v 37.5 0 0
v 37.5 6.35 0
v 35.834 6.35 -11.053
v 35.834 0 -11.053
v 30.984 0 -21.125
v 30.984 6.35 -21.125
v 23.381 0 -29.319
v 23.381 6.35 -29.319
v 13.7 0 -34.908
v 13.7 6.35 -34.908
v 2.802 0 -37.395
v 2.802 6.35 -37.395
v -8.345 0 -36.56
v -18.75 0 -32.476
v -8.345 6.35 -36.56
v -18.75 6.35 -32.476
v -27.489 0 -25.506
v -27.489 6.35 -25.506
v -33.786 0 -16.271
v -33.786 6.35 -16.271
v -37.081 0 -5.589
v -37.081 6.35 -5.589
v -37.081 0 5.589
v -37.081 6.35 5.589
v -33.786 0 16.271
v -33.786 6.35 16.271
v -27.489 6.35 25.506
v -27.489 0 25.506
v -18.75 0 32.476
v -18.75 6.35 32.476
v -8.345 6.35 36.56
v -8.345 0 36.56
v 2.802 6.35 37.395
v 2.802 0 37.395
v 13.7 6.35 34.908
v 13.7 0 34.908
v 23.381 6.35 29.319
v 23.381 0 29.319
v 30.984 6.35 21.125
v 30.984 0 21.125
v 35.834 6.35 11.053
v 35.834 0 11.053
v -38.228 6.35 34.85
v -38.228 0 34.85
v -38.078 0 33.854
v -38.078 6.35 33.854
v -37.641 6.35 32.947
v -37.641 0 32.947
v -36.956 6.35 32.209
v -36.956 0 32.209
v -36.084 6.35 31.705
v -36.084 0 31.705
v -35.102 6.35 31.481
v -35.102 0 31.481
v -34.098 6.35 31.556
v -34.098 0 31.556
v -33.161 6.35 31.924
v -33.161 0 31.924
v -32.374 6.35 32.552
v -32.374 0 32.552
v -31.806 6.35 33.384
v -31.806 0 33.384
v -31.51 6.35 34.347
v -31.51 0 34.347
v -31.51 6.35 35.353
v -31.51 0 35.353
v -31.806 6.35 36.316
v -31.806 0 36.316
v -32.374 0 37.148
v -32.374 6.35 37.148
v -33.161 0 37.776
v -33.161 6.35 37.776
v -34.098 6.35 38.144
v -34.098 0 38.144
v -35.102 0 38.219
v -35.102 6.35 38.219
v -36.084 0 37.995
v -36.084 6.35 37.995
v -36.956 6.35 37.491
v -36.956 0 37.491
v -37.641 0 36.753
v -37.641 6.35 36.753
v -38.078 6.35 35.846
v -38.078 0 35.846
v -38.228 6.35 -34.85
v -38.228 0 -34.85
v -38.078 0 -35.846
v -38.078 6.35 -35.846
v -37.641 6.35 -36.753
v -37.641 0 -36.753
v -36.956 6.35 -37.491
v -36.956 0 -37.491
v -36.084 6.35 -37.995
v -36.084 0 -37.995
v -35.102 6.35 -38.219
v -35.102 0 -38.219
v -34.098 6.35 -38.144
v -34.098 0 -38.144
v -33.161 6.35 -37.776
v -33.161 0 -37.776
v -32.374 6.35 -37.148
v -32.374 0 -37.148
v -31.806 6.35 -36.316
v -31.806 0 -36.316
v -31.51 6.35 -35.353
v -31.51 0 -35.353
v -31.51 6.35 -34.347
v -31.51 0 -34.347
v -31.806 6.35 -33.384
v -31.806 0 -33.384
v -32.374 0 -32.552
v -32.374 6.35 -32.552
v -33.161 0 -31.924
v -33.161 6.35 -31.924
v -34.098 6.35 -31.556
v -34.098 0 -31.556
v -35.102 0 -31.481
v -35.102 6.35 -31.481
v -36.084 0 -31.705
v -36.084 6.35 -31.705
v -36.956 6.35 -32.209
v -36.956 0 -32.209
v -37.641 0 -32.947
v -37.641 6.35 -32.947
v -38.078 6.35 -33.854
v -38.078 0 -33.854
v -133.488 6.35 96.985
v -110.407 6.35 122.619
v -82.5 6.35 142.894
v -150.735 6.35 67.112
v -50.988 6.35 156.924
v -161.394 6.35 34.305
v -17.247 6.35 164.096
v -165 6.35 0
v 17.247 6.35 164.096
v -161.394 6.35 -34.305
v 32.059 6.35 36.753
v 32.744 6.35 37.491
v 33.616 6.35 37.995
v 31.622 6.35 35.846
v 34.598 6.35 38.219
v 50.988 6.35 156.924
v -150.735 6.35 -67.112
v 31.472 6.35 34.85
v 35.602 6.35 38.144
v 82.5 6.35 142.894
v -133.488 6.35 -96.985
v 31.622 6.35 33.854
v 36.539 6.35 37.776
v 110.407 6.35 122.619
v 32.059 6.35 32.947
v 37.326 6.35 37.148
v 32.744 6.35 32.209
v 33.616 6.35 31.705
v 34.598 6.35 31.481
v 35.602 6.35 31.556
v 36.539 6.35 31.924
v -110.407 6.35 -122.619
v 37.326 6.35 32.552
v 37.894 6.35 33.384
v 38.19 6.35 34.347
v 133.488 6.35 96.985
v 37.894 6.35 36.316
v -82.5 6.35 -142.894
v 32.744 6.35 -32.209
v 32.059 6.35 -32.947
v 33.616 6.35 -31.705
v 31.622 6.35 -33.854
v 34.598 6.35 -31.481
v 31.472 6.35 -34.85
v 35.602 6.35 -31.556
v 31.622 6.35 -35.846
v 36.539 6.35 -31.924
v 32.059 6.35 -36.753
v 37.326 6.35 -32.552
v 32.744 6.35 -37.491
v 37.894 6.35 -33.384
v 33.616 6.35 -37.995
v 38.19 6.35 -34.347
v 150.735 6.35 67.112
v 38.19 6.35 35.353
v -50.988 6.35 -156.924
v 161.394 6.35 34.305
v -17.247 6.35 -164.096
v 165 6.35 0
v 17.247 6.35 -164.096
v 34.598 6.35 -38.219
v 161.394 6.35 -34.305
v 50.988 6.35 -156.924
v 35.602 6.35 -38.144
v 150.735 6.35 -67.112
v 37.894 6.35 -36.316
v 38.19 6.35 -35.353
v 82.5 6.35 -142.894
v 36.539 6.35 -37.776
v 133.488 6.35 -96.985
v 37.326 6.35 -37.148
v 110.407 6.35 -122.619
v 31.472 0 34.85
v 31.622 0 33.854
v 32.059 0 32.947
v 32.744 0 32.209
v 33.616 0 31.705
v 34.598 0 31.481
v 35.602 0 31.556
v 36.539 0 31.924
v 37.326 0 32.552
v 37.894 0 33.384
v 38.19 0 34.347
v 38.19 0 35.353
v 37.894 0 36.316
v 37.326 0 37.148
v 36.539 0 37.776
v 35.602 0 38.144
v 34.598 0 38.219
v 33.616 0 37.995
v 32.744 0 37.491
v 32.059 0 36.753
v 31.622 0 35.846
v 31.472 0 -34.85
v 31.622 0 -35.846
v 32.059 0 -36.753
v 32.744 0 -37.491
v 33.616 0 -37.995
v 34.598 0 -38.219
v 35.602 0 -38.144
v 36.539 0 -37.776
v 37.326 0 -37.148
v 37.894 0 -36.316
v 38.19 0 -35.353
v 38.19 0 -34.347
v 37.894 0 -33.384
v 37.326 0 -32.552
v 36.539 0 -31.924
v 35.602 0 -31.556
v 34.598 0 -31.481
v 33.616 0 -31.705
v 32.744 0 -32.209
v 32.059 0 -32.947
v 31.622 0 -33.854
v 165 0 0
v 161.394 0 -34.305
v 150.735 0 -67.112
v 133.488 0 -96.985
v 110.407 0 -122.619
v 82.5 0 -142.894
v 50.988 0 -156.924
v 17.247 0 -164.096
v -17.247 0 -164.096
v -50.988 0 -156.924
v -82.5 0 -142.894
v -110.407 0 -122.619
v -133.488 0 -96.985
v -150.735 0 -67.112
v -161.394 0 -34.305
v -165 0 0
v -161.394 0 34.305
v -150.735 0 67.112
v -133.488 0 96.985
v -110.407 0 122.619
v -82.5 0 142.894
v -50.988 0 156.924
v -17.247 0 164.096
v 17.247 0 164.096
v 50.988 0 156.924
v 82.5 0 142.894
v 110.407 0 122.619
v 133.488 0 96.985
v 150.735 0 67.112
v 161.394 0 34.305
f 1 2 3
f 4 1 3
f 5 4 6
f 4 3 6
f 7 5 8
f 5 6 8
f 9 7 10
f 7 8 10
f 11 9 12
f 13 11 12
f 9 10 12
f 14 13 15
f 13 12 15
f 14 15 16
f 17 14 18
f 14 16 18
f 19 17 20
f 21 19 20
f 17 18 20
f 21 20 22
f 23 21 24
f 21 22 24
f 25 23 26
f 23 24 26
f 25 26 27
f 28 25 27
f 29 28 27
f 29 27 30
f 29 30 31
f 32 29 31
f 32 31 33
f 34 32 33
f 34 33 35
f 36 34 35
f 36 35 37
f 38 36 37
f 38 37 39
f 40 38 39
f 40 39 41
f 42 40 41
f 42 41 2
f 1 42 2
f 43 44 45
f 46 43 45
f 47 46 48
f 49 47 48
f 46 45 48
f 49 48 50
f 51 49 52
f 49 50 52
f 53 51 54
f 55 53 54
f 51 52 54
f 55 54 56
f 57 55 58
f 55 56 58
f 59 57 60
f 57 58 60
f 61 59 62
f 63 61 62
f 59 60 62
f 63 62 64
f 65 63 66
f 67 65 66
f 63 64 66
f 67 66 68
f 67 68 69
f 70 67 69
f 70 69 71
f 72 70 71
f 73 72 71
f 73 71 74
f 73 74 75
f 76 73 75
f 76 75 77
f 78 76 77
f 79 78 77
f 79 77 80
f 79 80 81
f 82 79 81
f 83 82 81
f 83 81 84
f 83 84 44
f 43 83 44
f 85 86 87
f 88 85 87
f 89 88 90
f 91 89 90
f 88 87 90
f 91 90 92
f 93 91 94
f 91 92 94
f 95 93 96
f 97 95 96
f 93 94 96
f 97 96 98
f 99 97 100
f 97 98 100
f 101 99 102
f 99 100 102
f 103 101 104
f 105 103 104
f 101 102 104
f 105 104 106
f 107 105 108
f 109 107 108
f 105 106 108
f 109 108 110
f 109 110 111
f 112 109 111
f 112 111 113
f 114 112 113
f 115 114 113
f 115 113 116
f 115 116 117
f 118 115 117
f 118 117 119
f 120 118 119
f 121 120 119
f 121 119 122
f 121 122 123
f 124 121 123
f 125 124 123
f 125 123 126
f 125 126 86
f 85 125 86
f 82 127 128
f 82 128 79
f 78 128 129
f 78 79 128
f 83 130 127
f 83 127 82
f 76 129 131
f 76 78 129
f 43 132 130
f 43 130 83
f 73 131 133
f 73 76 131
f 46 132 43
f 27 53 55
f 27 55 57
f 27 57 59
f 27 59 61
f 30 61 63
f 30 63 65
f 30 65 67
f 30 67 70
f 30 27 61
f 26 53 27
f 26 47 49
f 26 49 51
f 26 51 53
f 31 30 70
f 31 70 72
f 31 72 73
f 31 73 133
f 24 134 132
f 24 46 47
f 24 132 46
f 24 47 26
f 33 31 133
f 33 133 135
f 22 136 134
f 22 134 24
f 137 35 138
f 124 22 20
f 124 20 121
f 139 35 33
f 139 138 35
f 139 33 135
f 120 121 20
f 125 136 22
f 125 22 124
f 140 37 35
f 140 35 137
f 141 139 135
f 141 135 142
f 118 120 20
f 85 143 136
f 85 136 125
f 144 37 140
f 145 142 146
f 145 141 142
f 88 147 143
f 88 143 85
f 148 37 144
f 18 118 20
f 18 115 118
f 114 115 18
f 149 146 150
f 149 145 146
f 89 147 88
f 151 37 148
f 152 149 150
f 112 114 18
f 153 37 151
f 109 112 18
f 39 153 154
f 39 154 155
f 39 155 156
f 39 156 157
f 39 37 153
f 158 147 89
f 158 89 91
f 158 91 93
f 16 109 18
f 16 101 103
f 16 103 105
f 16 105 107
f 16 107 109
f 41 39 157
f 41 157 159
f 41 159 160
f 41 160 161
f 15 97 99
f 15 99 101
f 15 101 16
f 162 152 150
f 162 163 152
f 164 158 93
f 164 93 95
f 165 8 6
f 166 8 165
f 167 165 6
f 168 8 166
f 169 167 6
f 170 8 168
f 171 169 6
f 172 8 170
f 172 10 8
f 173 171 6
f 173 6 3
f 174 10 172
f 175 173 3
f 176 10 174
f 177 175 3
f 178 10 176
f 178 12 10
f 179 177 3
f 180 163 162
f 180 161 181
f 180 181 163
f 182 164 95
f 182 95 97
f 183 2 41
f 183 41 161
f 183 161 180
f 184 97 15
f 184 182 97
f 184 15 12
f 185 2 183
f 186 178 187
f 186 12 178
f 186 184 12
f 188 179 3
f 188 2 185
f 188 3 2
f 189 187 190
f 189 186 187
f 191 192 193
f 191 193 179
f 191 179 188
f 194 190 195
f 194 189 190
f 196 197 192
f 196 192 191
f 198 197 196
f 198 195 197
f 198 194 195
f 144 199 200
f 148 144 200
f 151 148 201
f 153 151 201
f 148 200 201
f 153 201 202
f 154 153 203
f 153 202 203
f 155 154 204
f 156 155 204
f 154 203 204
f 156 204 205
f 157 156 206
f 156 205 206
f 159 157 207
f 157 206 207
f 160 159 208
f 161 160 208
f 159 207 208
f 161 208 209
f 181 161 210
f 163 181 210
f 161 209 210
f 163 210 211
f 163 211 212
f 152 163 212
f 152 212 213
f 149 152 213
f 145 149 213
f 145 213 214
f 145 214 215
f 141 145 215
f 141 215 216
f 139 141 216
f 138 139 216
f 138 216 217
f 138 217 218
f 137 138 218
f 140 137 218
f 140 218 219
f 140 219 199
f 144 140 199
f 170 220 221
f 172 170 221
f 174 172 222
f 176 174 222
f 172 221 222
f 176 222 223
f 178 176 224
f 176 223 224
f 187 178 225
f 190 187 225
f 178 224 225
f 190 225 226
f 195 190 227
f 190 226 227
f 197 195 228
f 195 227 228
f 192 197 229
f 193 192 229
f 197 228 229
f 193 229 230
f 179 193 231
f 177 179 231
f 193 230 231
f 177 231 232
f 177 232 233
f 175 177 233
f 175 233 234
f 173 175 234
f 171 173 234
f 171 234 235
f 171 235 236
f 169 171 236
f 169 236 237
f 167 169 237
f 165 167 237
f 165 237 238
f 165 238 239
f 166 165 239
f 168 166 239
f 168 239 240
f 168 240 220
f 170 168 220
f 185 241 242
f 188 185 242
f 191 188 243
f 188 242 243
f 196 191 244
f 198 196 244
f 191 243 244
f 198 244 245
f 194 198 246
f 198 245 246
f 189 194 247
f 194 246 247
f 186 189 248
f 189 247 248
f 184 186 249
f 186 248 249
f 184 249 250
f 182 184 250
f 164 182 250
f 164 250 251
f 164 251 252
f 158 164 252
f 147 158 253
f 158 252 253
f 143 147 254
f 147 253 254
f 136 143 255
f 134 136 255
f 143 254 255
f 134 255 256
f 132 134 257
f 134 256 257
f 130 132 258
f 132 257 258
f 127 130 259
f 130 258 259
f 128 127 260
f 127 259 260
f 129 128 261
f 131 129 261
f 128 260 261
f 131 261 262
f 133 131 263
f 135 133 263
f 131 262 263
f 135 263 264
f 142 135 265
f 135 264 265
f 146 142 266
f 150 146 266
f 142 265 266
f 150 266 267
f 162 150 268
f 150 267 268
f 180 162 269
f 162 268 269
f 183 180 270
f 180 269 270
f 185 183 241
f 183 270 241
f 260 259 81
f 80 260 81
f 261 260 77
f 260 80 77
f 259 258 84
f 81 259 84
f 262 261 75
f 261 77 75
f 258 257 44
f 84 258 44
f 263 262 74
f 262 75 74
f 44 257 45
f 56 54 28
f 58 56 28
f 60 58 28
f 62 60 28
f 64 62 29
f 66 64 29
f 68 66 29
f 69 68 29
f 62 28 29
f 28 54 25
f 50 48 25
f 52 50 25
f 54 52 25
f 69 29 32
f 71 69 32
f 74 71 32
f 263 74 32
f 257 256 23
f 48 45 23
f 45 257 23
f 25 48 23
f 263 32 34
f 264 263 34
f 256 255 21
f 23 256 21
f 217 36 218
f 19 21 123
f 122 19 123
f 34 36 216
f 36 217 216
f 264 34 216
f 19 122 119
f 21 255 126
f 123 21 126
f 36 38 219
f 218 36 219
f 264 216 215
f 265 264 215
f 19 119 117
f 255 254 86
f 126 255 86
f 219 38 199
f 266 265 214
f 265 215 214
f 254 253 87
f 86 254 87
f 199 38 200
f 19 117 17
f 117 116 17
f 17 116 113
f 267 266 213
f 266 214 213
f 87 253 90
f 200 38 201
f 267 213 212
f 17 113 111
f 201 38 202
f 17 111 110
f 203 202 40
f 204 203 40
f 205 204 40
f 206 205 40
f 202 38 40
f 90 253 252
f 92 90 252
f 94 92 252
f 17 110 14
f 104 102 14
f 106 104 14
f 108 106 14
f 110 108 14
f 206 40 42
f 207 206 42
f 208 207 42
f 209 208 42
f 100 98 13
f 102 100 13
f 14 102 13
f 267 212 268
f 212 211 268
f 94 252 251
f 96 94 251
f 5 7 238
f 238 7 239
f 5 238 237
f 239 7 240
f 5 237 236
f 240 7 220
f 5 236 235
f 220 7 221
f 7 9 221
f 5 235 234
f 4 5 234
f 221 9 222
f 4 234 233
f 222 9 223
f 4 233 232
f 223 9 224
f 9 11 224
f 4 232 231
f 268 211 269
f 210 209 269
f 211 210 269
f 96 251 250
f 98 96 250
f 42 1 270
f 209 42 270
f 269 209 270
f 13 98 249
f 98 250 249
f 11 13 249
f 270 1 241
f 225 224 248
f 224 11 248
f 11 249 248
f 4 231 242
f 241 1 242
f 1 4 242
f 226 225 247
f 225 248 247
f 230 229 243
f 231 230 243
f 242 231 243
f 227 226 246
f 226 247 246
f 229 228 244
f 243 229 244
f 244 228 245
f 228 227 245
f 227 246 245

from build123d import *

# Parameters (mm, degrees)
SKETCH1_R               = 165
BOSS_EXTRUDE1_DEPTH     = 6.35
F_1_4_CLEARANCE_HOLE2_D = 6.7564
SKETCH6_R               = 37.5
CUT_EXTRUDE1_DEPTH      = 7.35


with BuildPart() as part:
    # Sketch1 → Boss-Extrude1 (new body)
    with BuildSketch(Plane(origin=(0, 0, 0), x_dir=(1, 0, 0), z_dir=(0, 1, 0))):
        Circle(SKETCH1_R)
    extrude(amount=BOSS_EXTRUDE1_DEPTH)

    # 1/4 Clearance Hole2 (through all)
    with Locations(Plane(origin=(0, 6.35, 0), x_dir=(1, 0, 0), z_dir=(0, 1, 0))):
        with Locations((-34.85, 34.85), (34.85, -34.85), (34.85, 34.85), (-34.85, -34.85)):
            Hole(F_1_4_CLEARANCE_HOLE2_D / 2)

    # Sketch6 → Cut-Extrude1 (cut, through all)
    with BuildSketch(Plane(origin=(0, 6.35, 0), x_dir=(1, 0, 0), z_dir=(0, 1, 0))):
        Circle(SKETCH6_R)
    extrude(amount=-CUT_EXTRUDE1_DEPTH, mode=Mode.SUBTRACT)


solid = part.part
